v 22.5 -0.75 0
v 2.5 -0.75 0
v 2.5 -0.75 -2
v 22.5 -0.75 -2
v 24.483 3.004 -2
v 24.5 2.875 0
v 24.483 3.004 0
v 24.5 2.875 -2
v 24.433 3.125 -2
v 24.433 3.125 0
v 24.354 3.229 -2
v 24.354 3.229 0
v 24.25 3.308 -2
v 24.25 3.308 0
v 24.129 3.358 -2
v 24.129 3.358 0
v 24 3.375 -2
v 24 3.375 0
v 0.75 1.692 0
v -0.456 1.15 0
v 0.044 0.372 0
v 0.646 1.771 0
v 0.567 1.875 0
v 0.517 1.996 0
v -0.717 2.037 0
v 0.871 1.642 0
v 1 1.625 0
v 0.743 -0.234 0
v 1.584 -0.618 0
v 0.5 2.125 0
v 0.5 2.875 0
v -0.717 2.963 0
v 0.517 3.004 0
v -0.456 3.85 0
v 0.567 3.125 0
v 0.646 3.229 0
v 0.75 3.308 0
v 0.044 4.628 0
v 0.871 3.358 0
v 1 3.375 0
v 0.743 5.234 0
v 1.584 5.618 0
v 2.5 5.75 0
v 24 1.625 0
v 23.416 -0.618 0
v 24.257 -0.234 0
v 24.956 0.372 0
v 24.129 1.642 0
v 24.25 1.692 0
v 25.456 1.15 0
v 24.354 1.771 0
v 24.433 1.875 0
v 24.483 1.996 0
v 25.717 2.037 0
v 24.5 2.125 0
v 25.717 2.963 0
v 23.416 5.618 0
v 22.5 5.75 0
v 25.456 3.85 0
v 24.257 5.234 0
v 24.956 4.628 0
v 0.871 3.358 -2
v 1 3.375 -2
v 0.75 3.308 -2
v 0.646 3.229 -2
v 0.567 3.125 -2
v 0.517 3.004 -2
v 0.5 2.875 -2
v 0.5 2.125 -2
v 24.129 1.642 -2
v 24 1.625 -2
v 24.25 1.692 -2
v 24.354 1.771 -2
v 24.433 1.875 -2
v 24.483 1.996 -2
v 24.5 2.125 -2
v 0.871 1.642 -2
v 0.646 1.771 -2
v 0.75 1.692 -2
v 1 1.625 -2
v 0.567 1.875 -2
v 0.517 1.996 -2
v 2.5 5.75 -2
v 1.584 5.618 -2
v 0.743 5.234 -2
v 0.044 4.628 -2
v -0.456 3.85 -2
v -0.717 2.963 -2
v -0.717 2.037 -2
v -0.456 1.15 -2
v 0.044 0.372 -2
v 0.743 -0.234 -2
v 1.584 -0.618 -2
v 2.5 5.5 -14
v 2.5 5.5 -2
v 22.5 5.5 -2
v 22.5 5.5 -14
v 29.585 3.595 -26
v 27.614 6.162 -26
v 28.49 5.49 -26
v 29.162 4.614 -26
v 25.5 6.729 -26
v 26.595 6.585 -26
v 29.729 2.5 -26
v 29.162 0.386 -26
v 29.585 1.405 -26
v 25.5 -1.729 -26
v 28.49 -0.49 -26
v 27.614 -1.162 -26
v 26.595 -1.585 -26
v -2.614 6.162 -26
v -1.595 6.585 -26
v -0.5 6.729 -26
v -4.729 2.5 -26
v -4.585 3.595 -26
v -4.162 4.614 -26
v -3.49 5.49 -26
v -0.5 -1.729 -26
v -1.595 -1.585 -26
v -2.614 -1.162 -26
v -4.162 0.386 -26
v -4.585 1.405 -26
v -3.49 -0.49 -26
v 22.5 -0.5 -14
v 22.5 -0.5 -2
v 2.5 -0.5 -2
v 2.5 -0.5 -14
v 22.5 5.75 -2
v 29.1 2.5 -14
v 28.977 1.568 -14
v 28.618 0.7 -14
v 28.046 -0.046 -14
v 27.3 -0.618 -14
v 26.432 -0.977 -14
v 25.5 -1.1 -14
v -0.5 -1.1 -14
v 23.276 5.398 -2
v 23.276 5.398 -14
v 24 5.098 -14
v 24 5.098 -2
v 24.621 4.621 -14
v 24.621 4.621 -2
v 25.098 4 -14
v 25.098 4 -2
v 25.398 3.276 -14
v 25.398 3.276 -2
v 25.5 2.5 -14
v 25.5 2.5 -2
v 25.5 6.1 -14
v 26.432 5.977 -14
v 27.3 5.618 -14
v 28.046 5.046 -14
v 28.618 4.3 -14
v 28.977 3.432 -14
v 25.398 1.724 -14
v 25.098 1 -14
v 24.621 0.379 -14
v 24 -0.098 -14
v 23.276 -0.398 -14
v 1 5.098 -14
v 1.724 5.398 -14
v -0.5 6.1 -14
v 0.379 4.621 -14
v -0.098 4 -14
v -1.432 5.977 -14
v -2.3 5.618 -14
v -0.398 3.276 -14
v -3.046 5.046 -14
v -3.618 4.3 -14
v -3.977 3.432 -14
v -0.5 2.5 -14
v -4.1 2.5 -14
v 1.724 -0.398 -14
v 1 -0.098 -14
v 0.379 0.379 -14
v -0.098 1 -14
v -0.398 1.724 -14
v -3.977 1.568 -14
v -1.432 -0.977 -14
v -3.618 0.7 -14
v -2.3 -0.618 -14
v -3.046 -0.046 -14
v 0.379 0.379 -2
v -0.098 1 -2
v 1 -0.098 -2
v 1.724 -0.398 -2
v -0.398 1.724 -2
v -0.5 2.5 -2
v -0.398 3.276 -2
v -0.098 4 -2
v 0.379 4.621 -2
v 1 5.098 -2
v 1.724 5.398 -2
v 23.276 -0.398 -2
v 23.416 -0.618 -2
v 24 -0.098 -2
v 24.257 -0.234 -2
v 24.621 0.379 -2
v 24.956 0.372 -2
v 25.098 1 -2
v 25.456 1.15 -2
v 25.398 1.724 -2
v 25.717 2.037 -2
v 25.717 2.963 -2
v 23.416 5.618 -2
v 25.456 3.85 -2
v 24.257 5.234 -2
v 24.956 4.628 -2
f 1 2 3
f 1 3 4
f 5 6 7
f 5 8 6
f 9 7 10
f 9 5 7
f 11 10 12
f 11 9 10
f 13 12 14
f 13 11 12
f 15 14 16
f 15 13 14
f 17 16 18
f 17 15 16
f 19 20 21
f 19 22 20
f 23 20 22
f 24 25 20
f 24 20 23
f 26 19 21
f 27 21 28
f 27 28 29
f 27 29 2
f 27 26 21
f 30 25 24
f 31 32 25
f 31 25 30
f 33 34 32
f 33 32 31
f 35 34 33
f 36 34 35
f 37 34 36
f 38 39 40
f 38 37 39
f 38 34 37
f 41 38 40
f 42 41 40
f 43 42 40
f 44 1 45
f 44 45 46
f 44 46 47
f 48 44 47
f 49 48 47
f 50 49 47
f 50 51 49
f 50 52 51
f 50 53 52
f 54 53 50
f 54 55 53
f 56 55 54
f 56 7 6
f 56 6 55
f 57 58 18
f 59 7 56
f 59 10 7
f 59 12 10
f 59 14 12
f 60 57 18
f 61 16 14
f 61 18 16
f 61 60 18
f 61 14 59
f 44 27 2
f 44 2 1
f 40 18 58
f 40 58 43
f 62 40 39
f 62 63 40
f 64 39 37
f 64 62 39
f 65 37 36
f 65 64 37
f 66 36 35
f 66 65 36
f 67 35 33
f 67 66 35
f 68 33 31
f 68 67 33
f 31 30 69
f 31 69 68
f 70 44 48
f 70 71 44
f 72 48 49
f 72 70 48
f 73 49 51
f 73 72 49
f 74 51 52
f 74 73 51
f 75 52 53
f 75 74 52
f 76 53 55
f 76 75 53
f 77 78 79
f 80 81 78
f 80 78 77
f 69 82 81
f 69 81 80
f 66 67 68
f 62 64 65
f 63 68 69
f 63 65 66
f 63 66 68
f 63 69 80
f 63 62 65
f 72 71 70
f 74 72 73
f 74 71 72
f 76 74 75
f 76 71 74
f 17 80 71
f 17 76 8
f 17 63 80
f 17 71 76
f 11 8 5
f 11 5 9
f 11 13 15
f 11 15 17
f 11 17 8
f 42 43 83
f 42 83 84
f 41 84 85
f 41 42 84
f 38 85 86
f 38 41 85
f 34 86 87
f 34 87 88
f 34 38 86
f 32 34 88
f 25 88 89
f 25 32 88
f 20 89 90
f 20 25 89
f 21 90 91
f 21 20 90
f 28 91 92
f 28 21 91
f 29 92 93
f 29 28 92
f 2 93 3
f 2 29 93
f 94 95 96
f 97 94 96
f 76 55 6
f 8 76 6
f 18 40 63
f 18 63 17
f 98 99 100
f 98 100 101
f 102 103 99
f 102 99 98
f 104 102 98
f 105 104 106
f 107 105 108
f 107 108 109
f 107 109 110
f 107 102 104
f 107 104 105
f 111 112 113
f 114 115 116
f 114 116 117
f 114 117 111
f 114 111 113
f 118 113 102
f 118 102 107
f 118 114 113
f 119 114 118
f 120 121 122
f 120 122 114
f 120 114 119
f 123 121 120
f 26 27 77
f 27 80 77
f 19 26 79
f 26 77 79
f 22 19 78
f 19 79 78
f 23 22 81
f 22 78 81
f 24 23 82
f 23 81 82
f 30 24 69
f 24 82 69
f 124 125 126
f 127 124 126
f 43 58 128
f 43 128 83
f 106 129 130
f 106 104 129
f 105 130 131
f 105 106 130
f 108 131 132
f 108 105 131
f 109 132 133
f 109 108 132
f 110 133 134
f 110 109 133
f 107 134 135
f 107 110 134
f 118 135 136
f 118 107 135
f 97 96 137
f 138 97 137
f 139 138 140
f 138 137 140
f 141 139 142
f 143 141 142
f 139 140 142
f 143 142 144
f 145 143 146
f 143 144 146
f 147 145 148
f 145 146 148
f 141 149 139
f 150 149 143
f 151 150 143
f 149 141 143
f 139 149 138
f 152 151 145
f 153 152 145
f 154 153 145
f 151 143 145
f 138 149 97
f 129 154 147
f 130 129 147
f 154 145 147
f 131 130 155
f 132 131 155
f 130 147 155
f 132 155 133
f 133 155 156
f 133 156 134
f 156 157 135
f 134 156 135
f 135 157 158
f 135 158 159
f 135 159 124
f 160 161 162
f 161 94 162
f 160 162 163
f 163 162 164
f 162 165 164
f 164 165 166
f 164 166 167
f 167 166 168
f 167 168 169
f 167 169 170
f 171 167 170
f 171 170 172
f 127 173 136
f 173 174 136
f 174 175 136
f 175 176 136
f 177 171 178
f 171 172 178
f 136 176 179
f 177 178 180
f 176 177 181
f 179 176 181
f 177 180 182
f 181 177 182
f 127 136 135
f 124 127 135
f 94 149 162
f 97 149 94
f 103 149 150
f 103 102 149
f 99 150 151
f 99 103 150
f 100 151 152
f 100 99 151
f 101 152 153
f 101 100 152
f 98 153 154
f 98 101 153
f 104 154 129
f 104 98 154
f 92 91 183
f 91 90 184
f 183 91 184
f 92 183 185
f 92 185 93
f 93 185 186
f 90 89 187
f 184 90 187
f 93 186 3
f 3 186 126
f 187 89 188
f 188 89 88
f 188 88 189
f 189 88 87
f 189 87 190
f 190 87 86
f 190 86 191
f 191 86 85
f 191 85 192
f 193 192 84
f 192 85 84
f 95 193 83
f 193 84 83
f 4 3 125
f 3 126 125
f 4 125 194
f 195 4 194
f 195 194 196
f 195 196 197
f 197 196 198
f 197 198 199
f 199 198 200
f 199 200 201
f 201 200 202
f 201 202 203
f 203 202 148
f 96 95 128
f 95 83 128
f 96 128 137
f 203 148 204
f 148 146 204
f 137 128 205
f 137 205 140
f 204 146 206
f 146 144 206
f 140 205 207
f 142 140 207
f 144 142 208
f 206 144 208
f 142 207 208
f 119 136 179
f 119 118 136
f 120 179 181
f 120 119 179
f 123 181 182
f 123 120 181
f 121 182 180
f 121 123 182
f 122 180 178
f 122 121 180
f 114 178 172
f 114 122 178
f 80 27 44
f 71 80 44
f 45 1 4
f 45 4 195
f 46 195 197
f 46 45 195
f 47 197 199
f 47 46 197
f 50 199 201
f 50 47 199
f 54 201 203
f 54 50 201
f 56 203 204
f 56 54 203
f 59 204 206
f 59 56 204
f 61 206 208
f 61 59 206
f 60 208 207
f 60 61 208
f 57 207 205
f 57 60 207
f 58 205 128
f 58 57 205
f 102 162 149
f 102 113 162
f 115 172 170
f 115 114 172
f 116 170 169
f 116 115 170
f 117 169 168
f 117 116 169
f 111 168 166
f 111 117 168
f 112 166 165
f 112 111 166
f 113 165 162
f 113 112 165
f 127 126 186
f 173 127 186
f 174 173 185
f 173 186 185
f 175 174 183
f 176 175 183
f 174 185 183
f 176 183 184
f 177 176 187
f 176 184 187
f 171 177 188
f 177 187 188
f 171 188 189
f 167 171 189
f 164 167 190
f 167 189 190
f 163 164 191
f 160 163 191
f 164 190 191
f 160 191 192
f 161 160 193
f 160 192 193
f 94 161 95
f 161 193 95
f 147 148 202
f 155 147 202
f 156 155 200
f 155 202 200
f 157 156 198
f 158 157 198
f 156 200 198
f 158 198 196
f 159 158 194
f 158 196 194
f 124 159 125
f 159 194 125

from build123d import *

# Parameters (mm, degrees)
F1_DEPTH  = 2
F3_DEPTH  = 12
F5_DEPTH  = 12
F5_TAPER  = -3
F6_W      = 24
F6_H      = 1.75
F7_DEPTH  = 2
F8_R      = 0.5
F10_DEPTH = 2


with BuildPart() as f1:
    # F0 (on Top) → F1 (new body)
    with BuildSketch(Plane.XY):
        with BuildLine():
            ThreePointArc((0, 2.5), (0.732233047, 0.732233047), (2.5, 0))
            Line((2.5, 0), (22.5, 0))
            ThreePointArc((22.5, 0), (24.267766953, 0.732233047), (25, 2.5))
            ThreePointArc((25, 2.5), (24.267766953, 4.267766953), (22.5, 5))
            Line((22.5, 5), (2.5, 5))
            ThreePointArc((2.5, 5), (0.732233047, 4.267766953), (0, 2.5))
        make_face()
    extrude(amount=-F1_DEPTH)

    # F2 (on face) → F3 (join)
    with BuildSketch(Plane(origin=(0, 0, -2), x_dir=(1, 0, 0), z_dir=(0, 0, -1))):
        with BuildLine():
            ThreePointArc((2.5, 0.5), (0.3786796564, -0.3786796564), (-0.5, -2.5))
            ThreePointArc((-0.5, -2.5), (0.3786796564, -4.6213203436), (2.5, -5.5))
            Line((2.5, -5.5), (22.5, -5.5))
            ThreePointArc((22.5, -5.5), (24.6213203436, -4.6213203436), (25.5, -2.5))
            ThreePointArc((25.5, -2.5), (24.6213203436, -0.3786796564), (22.5, 0.5))
            Line((22.5, 0.5), (2.5, 0.5))
        make_face()
        with BuildLine():
            Line((2.5, 0), (22.5, 0))
            ThreePointArc((22.5, 0), (25, -2.5), (22.5, -5))
            Line((22.5, -5), (2.5, -5))
            ThreePointArc((2.5, -5), (0, -2.5), (2.5, 0))
        make_face(mode=Mode.SUBTRACT)
        with BuildLine():
            ThreePointArc((22.5, -5), (25, -2.5), (22.5, 0))
            Line((22.5, 0), (2.5, 0))
            ThreePointArc((2.5, 0), (0, -2.5), (2.5, -5))
            Line((2.5, -5), (22.5, -5))
        make_face()
    extrude(amount=F3_DEPTH)

    # F4 (on face) → F5 (join)
    with BuildSketch(Plane(origin=(0, 0, -14), x_dir=(1, 0, 0), z_dir=(0, 0, -1))):
        with BuildLine():
            Line((25.5, 1.099999994), (-0.5, 1.099999994))
            ThreePointArc((-0.5, 1.099999994), (-3.0455844081, 0.0455844081), (-4.099999994, -2.5))
            ThreePointArc((-4.099999994, -2.5), (-3.0455844081, -5.0455844081), (-0.5, -6.099999994))
            Line((-0.5, -6.099999994), (25.5, -6.099999994))
            ThreePointArc((25.5, -6.099999994), (28.0455844081, -5.0455844081), (29.099999994, -2.5))
            ThreePointArc((29.099999994, -2.5), (28.0455844081, 0.0455844081), (25.5, 1.099999994))
        make_face()
        with BuildLine():
            ThreePointArc((-3.5, -2.5), (-2.6213203436, -0.3786796564), (-0.5, 0.5))
            Line((-0.5, 0.5), (2.5, 0.5))
            Line((2.5, 0.5), (22.5, 0.5))
            Line((22.5, 0.5), (25.5, 0.5))
            ThreePointArc((25.5, 0.5), (27.6213203436, -0.3786796564), (28.5, -2.5))
            ThreePointArc((28.5, -2.5), (27.6213203436, -4.6213203436), (25.5, -5.5))
            Line((25.5, -5.5), (22.5, -5.5))
            Line((22.5, -5.5), (2.5, -5.5))
            Line((2.5, -5.5), (-0.5, -5.5))
            ThreePointArc((-0.5, -5.5), (-2.6213203436, -4.6213203436), (-3.5, -2.5))
        make_face(mode=Mode.SUBTRACT)
        with BuildLine():
            Line((22.5, 0.5), (2.5, 0.5))
            ThreePointArc((2.5, 0.5), (-0.5, -2.5), (2.5, -5.5))
            Line((2.5, -5.5), (22.5, -5.5))
            ThreePointArc((22.5, -5.5), (25.5, -2.5), (22.5, 0.5))
        make_face()
        with BuildLine():
            Line((2.5, 0.5), (-0.5, 0.5))
            ThreePointArc((-0.5, 0.5), (-2.6213203436, -0.3786796564), (-3.5, -2.5))
            ThreePointArc((-3.5, -2.5), (-2.6213203436, -4.6213203436), (-0.5, -5.5))
            Line((-0.5, -5.5), (2.5, -5.5))
            ThreePointArc((2.5, -5.5), (-0.5, -2.5), (2.5, 0.5))
        make_face()
        with BuildLine():
            Line((25.5, 0.5), (22.5, 0.5))
            ThreePointArc((22.5, 0.5), (25.5, -2.5), (22.5, -5.5))
            Line((22.5, -5.5), (25.5, -5.5))
            ThreePointArc((25.5, -5.5), (27.6213203436, -4.6213203436), (28.5, -2.5))
            ThreePointArc((28.5, -2.5), (27.6213203436, -0.3786796564), (25.5, 0.5))
        make_face()
    extrude(amount=F5_DEPTH, taper=F5_TAPER)

    # F6 (on face) → F7 (cut)
    with BuildSketch(Plane.XY):
        with Locations((12.5, 2.5)):
            Rectangle(F6_W, F6_H)
    extrude(amount=-F7_DEPTH, mode=Mode.SUBTRACT)

    # F8
    f8_edges = [f1.edges().sort_by_distance(p)[0] for p in [
        (0.5, 3.375, -1),
        (0.5, 1.625, -1),
        (24.5, 1.625, -1),
        (24.5, 3.375, -1),
    ]]
    fillet(f8_edges, radius=F8_R)

    # F9 (on face) → F10 (join)
    with BuildSketch(Plane.XY):
        with BuildLine():
            Line((22.5, 5.75), (2.5, 5.75))
            ThreePointArc((2.5, 5.75), (-0.75, 2.5), (2.5, -0.75))
            Line((2.5, -0.75), (22.5, -0.75))
            ThreePointArc((22.5, -0.75), (25.75, 2.5), (22.5, 5.75))
        make_face()
        with BuildLine():
            ThreePointArc((2.5, 0), (0, 2.5), (2.5, 5))
            Line((2.5, 5), (22.5, 5))
            ThreePointArc((22.5, 5), (25, 2.5), (22.5, 0))
            Line((22.5, 0), (2.5, 0))
        make_face(mode=Mode.SUBTRACT)
    extrude(amount=-F10_DEPTH)


solid = f1.part
